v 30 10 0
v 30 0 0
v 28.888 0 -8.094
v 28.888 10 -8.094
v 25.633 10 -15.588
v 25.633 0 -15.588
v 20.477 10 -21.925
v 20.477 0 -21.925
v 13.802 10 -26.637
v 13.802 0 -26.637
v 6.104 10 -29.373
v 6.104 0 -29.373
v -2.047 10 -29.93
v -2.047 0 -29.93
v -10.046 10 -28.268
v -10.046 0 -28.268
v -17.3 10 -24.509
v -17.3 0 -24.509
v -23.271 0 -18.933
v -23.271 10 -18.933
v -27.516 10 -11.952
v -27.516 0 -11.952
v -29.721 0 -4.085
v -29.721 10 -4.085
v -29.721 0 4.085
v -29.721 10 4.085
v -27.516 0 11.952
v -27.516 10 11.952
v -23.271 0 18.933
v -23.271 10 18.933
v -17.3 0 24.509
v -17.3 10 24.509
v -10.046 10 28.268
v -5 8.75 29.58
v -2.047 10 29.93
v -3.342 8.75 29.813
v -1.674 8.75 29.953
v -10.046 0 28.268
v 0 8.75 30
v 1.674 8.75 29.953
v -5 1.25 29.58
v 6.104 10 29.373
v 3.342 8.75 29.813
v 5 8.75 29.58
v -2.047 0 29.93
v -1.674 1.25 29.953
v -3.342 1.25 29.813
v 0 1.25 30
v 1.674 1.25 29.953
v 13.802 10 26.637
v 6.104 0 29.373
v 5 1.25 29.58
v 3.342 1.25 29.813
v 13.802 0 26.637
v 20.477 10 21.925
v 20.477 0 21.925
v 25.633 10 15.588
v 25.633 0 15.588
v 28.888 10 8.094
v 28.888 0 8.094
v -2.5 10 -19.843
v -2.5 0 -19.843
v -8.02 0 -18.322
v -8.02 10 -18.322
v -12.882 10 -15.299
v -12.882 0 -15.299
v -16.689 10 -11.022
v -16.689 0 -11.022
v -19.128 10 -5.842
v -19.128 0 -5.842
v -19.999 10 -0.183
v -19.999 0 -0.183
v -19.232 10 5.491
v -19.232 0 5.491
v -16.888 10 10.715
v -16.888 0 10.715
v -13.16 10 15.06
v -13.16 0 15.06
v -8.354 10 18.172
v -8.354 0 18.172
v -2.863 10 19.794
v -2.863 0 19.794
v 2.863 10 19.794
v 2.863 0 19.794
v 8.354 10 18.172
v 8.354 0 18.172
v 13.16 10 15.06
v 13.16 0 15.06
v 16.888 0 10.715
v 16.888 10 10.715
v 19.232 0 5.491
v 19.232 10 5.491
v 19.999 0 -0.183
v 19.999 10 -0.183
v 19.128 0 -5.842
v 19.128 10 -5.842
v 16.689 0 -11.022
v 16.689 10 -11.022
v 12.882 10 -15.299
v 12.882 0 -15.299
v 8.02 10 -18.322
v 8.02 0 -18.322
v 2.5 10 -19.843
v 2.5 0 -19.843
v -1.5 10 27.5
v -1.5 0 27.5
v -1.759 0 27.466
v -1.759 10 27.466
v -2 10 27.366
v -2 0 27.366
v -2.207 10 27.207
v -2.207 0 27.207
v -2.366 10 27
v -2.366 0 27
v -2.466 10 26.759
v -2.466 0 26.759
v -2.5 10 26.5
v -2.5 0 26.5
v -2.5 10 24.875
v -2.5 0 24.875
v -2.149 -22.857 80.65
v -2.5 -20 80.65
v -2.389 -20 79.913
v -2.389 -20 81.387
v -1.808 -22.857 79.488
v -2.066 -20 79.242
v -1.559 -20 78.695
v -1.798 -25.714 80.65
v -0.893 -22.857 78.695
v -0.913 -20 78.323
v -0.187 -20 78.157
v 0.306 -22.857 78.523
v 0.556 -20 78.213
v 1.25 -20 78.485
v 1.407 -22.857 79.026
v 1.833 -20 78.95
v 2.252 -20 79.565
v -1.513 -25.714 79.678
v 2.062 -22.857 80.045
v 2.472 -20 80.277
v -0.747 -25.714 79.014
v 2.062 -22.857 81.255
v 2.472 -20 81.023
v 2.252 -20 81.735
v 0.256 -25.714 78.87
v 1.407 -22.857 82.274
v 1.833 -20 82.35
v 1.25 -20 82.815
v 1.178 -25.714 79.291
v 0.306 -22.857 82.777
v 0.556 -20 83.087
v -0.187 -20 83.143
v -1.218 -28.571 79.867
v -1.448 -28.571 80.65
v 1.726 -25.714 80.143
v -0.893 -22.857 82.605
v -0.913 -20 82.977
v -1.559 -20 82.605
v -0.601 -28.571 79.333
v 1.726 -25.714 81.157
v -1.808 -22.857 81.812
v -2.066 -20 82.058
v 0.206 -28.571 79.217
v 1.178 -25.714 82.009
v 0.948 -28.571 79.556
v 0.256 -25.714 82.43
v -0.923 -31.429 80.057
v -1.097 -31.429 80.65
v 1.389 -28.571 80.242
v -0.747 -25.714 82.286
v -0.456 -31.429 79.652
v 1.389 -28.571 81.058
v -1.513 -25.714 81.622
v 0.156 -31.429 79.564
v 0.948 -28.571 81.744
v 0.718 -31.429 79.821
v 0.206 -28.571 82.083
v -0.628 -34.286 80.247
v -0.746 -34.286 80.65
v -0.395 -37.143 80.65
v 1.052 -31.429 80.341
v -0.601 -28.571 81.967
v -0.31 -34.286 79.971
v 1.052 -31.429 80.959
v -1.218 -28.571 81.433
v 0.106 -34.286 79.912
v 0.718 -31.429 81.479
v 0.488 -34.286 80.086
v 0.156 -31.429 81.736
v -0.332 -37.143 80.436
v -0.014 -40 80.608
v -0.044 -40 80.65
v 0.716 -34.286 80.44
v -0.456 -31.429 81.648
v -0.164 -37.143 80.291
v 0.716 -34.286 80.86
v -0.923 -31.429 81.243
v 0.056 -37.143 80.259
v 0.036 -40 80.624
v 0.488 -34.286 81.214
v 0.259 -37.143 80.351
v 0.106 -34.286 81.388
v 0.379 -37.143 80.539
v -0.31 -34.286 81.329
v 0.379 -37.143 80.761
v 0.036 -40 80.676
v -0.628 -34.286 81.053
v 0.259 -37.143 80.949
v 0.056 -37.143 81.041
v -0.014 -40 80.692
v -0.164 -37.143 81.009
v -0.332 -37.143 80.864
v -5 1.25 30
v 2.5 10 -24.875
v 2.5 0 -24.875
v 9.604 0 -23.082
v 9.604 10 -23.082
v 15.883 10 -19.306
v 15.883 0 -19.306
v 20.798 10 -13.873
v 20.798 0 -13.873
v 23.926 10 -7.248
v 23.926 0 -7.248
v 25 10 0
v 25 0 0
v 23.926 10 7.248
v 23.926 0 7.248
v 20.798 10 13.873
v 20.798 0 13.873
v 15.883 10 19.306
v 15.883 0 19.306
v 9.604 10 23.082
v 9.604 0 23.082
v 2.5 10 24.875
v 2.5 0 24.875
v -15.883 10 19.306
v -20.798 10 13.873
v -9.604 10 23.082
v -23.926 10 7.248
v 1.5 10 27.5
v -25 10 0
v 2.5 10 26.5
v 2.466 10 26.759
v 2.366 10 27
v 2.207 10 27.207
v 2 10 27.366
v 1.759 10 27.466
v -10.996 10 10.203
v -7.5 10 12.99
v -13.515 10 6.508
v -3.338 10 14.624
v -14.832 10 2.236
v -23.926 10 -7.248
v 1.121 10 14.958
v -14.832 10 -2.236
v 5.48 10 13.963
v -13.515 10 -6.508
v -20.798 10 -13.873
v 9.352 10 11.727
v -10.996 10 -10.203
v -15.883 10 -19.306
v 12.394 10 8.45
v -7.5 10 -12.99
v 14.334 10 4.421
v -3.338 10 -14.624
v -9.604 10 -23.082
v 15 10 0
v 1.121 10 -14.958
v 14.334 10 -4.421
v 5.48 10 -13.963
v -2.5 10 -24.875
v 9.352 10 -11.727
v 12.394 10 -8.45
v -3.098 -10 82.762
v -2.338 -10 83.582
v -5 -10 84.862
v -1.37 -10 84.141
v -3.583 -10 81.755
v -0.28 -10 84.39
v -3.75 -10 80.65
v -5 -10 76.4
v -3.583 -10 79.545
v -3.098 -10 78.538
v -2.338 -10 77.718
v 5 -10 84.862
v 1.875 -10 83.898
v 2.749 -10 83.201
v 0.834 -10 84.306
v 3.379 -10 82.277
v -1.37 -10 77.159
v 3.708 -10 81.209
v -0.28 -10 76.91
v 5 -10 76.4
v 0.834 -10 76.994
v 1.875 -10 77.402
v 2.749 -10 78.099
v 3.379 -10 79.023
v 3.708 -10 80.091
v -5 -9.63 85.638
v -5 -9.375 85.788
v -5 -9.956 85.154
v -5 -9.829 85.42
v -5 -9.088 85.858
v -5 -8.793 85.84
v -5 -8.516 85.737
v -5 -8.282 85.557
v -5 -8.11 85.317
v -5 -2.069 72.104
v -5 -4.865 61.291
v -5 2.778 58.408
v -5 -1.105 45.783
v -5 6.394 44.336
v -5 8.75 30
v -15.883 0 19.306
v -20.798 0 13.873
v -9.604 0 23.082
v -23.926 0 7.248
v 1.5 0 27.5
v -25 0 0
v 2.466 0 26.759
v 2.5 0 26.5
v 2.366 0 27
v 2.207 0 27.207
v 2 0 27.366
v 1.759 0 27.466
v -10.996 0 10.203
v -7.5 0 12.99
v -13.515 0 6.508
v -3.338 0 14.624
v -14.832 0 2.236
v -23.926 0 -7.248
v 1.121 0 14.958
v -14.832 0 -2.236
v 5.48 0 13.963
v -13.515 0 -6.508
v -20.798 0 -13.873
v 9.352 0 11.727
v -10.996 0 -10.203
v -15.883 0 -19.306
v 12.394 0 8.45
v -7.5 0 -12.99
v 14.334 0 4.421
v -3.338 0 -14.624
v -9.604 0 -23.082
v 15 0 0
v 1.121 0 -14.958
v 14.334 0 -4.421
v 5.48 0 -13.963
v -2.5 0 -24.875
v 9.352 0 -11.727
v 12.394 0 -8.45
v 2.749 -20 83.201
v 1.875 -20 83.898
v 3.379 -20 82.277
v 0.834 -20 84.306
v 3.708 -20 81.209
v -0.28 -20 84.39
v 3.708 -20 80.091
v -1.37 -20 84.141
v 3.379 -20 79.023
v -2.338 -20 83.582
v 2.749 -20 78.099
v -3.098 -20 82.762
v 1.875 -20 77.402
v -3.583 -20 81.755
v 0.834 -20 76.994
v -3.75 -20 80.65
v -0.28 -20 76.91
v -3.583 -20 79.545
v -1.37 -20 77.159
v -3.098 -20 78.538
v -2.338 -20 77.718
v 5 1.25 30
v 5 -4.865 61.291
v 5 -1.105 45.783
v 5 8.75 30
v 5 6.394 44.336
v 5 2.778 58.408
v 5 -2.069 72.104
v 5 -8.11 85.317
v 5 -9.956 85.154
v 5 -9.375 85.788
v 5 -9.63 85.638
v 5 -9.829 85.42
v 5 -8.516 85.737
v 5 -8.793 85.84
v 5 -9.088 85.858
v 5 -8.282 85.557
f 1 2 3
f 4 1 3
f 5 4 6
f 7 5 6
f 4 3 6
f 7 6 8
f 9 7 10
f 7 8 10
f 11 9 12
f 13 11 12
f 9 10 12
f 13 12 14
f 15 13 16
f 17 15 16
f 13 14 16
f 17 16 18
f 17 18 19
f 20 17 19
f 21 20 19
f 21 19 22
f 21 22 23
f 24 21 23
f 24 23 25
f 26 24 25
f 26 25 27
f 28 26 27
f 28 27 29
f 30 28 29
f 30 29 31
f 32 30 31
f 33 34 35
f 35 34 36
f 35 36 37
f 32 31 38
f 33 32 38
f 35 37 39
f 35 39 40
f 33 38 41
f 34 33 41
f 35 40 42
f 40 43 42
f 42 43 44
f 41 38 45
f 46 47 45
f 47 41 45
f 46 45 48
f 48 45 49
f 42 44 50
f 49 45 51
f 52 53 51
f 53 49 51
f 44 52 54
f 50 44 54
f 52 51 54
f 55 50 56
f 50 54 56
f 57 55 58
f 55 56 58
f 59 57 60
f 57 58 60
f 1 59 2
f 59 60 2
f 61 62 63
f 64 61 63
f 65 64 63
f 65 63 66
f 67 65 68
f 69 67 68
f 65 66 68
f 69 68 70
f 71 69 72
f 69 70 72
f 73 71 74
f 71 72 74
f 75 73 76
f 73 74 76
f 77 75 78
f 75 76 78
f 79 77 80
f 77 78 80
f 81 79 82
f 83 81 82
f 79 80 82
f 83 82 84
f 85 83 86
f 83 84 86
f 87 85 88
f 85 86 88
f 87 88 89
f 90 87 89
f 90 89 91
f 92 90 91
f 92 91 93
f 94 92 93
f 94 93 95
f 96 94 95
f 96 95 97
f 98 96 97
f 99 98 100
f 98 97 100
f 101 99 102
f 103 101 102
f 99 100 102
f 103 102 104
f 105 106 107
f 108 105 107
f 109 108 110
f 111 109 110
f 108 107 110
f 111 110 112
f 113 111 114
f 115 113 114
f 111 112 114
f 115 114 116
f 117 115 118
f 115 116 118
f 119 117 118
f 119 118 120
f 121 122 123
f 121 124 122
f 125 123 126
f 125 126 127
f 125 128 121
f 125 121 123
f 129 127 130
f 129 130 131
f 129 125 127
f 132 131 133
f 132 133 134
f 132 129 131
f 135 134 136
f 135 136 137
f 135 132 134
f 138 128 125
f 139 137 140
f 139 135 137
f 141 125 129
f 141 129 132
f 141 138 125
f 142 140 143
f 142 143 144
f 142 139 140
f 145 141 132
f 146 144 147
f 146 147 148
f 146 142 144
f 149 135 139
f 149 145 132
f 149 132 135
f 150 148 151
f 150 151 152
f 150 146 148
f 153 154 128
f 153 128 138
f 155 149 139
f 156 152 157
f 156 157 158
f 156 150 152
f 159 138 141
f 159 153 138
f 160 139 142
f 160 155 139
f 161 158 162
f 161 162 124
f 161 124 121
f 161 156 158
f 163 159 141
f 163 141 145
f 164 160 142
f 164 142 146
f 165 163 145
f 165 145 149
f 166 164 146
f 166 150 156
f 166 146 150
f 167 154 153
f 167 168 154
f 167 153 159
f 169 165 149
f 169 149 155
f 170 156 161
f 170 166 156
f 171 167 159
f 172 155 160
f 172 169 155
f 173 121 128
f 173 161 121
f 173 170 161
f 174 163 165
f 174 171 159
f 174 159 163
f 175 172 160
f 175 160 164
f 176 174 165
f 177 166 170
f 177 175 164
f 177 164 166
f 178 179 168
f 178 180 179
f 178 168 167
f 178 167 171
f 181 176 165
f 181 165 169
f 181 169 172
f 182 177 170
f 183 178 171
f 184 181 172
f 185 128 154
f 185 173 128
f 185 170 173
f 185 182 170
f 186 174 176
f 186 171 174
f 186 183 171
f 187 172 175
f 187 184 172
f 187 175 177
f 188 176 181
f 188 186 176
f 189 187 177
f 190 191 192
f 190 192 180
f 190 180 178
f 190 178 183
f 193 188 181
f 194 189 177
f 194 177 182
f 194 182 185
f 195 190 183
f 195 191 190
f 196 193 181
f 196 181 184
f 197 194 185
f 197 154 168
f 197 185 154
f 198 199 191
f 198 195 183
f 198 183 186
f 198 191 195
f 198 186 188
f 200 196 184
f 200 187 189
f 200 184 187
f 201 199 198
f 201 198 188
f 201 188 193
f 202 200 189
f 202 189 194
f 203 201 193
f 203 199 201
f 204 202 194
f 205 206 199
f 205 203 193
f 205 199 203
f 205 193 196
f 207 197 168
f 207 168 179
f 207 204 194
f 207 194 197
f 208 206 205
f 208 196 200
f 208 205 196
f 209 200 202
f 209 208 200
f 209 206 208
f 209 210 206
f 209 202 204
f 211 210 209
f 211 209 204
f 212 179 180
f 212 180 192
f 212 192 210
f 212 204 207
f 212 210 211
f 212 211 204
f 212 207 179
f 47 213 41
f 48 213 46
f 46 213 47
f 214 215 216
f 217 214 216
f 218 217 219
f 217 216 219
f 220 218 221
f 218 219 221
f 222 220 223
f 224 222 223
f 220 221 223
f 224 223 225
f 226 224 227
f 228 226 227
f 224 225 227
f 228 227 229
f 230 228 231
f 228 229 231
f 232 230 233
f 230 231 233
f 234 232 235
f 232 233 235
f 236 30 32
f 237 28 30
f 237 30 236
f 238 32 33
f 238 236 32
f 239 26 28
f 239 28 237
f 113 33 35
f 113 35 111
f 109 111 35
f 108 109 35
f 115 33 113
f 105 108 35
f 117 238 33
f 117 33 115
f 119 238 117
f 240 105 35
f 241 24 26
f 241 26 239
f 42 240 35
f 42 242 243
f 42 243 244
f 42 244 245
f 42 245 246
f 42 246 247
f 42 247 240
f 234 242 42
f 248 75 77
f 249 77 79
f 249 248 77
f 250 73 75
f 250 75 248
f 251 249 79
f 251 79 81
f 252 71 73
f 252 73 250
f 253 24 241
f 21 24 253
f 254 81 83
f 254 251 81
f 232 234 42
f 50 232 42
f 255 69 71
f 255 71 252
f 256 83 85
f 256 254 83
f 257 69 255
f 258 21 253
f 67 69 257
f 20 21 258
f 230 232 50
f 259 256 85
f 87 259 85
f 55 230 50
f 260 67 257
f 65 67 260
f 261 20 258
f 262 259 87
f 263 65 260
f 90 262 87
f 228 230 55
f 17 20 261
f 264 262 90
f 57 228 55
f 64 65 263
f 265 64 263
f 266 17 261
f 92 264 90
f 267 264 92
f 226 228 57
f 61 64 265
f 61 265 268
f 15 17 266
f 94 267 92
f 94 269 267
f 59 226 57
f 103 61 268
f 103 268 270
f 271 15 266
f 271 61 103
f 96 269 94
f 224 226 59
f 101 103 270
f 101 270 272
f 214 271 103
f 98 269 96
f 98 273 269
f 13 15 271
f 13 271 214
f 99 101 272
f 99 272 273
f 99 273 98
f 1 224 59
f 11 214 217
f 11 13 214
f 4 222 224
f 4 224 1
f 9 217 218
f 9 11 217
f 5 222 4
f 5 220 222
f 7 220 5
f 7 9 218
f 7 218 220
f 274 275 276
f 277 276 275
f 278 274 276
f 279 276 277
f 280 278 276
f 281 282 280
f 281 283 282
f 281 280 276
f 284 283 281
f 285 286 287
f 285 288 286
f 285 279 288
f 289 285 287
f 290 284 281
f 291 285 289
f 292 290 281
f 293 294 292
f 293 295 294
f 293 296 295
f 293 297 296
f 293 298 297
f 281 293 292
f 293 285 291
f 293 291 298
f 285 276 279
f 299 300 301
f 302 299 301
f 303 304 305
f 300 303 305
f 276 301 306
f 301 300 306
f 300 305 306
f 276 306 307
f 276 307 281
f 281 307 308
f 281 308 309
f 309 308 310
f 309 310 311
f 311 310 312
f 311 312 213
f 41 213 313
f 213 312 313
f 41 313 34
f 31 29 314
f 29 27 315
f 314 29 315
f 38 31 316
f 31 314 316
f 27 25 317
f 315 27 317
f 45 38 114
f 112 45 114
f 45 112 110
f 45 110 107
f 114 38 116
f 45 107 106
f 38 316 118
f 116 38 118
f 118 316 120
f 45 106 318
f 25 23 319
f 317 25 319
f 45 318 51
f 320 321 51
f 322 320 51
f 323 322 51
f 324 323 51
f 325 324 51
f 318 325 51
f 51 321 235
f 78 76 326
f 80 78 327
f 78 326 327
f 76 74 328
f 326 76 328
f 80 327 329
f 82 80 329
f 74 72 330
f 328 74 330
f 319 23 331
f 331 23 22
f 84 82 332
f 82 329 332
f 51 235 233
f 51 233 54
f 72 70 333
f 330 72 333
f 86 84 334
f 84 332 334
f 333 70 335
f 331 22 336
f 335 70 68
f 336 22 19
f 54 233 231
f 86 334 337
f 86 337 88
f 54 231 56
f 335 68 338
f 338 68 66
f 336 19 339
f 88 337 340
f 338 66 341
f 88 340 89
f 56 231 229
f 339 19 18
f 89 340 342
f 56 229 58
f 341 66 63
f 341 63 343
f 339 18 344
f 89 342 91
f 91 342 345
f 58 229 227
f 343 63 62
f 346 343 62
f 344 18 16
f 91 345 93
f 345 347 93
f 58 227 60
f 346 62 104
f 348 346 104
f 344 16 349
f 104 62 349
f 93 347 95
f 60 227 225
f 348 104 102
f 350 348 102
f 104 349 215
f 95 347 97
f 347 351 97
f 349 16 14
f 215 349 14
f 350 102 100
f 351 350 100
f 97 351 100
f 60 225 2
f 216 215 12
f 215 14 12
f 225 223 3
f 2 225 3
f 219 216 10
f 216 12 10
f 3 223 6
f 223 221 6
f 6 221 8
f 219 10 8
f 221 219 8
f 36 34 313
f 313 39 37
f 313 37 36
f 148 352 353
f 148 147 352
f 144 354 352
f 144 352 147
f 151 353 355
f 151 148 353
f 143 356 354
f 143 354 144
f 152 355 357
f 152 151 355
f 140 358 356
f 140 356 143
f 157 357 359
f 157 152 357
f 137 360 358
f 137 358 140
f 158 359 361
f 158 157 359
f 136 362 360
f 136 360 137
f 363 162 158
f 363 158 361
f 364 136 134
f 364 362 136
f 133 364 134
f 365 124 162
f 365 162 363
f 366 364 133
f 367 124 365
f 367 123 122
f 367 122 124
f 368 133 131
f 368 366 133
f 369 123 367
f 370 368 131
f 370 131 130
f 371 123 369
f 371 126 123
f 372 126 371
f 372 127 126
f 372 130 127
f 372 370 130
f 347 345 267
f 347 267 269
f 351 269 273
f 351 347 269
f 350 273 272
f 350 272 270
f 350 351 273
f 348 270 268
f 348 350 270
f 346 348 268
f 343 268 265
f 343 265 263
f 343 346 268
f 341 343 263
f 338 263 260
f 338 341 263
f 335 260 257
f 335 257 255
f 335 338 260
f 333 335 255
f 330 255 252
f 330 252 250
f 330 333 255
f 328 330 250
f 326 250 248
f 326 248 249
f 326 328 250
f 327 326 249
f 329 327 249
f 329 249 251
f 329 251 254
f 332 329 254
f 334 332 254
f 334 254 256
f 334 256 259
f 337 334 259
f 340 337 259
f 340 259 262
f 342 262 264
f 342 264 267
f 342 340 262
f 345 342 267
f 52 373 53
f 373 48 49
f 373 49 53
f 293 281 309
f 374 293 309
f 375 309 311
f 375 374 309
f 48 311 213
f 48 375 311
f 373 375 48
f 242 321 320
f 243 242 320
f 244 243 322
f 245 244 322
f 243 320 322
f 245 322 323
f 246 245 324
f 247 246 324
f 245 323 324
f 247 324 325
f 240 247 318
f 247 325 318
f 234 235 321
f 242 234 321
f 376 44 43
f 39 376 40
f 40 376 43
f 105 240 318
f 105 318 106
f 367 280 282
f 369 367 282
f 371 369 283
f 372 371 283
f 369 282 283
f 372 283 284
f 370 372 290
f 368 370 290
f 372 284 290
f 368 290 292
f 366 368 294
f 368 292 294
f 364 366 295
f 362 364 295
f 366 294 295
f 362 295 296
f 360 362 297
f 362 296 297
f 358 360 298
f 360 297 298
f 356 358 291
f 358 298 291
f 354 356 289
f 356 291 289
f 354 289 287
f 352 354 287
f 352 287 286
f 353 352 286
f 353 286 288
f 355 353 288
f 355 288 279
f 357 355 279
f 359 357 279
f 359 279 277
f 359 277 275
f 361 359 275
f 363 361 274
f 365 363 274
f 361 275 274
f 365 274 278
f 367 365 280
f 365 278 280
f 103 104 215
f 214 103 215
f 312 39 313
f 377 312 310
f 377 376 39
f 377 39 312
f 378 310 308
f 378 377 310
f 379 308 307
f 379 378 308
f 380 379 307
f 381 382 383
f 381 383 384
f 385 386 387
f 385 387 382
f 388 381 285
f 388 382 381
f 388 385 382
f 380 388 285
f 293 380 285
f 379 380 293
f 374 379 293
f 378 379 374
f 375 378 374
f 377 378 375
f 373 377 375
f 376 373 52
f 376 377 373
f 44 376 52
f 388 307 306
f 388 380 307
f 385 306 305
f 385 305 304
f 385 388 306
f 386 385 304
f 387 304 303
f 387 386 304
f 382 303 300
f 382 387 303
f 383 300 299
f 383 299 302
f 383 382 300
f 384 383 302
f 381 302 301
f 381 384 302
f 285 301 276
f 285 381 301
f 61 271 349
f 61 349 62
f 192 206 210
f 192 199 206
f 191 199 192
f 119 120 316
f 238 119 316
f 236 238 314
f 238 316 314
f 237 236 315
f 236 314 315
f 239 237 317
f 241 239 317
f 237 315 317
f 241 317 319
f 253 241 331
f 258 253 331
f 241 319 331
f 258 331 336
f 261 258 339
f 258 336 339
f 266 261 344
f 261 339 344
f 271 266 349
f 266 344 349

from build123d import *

# Parameters (mm, degrees)
SKETCH1_R           = 30
SKETCH1_R_2         = 15
BOSS_EXTRUDE1_DEPTH = 10
BOSS_EXTRUDE2_DEPTH = 5
SKETCH3_R           = 3.75
BOSS_EXTRUDE3_DEPTH = 10
SKETCH5_R           = 2.5
BOSS_EXTRUDE4_DEPTH = 20
BOSS_EXTRUDE4_TAPER = 7


with BuildPart() as part:
    # Sketch1 → Boss-Extrude1 (new body)
    with BuildSketch(Plane(origin=(0, 0, 0), x_dir=(1, 0, 0), z_dir=(0, 1, 0))):
        Circle(SKETCH1_R)
        with BuildLine():
            ThreePointArc((-2.5, -24.874685928), (-25, 0), (-2.5, 24.874685928))
            Line((-2.5, 24.874685928), (-2.5, 19.843134833))
            ThreePointArc((-2.5, 19.843134833), (0, -20), (2.5, 19.843134833))
            Line((2.5, 19.843134833), (2.5, 24.874685928))
            ThreePointArc((2.5, 24.874685928), (25, 0), (2.5, -24.874685928))
            Line((2.5, -24.874685928), (2.5, -26.5))
            ThreePointArc((2.5, -26.5), (2.207106781, -27.207106781), (1.5, -27.5))
            Line((1.5, -27.5), (-1.5, -27.5))
            ThreePointArc((-1.5, -27.5), (-2.207106781, -27.207106781), (-2.5, -26.5))
            Line((-2.5, -26.5), (-2.5, -24.874685928))
        make_face(mode=Mode.SUBTRACT)
        Circle(SKETCH1_R_2, mode=Mode.SUBTRACT)
    extrude(amount=BOSS_EXTRUDE1_DEPTH)

    # Sketch2 → Boss-Extrude2 (add, symmetric)
    with BuildSketch(Plane(origin=(0, 0, 0), x_dir=(0, 0, -1), z_dir=(1, 0, 0))):
        with BuildLine():
            Line((-84.861603584, -10), (-76.4, -10))
            ThreePointArc((-76.4, -10), (-53.579230072, -2.810886638), (-30, 1.25))
            Line((-30, 1.25), (-27.5, 1.25))
            Line((-27.5, 1.25), (-27.5, 8.75))
            Line((-27.5, 8.75), (-30, 8.75))
            ThreePointArc((-30, 8.75), (-58.40777346, 2.778023012), (-85.317259729, -8.109844128))
            ThreePointArc((-85.317259729, -8.109844128), (-85.833754774, -9.234354569), (-84.861603584, -10))
        make_face()
    extrude(amount=BOSS_EXTRUDE2_DEPTH, both=True)

    # Sketch3 → Boss-Extrude3 (add)
    with BuildSketch(Plane(origin=(0, -10, 0), x_dir=(-1, 0, 0), z_dir=(0, -1, 0))):
        with Locations((0, -80.65)):
            Circle(SKETCH3_R)
    extrude(amount=BOSS_EXTRUDE3_DEPTH)

    # Sketch5 → Boss-Extrude4 (add)
    with BuildSketch(Plane(origin=(0, -20, 0), x_dir=(-1, 0, 0), z_dir=(0, -1, 0))):
        with Locations((0, -80.65)):
            Circle(SKETCH5_R)
    extrude(amount=BOSS_EXTRUDE4_DEPTH, taper=BOSS_EXTRUDE4_TAPER)


solid = part.part
